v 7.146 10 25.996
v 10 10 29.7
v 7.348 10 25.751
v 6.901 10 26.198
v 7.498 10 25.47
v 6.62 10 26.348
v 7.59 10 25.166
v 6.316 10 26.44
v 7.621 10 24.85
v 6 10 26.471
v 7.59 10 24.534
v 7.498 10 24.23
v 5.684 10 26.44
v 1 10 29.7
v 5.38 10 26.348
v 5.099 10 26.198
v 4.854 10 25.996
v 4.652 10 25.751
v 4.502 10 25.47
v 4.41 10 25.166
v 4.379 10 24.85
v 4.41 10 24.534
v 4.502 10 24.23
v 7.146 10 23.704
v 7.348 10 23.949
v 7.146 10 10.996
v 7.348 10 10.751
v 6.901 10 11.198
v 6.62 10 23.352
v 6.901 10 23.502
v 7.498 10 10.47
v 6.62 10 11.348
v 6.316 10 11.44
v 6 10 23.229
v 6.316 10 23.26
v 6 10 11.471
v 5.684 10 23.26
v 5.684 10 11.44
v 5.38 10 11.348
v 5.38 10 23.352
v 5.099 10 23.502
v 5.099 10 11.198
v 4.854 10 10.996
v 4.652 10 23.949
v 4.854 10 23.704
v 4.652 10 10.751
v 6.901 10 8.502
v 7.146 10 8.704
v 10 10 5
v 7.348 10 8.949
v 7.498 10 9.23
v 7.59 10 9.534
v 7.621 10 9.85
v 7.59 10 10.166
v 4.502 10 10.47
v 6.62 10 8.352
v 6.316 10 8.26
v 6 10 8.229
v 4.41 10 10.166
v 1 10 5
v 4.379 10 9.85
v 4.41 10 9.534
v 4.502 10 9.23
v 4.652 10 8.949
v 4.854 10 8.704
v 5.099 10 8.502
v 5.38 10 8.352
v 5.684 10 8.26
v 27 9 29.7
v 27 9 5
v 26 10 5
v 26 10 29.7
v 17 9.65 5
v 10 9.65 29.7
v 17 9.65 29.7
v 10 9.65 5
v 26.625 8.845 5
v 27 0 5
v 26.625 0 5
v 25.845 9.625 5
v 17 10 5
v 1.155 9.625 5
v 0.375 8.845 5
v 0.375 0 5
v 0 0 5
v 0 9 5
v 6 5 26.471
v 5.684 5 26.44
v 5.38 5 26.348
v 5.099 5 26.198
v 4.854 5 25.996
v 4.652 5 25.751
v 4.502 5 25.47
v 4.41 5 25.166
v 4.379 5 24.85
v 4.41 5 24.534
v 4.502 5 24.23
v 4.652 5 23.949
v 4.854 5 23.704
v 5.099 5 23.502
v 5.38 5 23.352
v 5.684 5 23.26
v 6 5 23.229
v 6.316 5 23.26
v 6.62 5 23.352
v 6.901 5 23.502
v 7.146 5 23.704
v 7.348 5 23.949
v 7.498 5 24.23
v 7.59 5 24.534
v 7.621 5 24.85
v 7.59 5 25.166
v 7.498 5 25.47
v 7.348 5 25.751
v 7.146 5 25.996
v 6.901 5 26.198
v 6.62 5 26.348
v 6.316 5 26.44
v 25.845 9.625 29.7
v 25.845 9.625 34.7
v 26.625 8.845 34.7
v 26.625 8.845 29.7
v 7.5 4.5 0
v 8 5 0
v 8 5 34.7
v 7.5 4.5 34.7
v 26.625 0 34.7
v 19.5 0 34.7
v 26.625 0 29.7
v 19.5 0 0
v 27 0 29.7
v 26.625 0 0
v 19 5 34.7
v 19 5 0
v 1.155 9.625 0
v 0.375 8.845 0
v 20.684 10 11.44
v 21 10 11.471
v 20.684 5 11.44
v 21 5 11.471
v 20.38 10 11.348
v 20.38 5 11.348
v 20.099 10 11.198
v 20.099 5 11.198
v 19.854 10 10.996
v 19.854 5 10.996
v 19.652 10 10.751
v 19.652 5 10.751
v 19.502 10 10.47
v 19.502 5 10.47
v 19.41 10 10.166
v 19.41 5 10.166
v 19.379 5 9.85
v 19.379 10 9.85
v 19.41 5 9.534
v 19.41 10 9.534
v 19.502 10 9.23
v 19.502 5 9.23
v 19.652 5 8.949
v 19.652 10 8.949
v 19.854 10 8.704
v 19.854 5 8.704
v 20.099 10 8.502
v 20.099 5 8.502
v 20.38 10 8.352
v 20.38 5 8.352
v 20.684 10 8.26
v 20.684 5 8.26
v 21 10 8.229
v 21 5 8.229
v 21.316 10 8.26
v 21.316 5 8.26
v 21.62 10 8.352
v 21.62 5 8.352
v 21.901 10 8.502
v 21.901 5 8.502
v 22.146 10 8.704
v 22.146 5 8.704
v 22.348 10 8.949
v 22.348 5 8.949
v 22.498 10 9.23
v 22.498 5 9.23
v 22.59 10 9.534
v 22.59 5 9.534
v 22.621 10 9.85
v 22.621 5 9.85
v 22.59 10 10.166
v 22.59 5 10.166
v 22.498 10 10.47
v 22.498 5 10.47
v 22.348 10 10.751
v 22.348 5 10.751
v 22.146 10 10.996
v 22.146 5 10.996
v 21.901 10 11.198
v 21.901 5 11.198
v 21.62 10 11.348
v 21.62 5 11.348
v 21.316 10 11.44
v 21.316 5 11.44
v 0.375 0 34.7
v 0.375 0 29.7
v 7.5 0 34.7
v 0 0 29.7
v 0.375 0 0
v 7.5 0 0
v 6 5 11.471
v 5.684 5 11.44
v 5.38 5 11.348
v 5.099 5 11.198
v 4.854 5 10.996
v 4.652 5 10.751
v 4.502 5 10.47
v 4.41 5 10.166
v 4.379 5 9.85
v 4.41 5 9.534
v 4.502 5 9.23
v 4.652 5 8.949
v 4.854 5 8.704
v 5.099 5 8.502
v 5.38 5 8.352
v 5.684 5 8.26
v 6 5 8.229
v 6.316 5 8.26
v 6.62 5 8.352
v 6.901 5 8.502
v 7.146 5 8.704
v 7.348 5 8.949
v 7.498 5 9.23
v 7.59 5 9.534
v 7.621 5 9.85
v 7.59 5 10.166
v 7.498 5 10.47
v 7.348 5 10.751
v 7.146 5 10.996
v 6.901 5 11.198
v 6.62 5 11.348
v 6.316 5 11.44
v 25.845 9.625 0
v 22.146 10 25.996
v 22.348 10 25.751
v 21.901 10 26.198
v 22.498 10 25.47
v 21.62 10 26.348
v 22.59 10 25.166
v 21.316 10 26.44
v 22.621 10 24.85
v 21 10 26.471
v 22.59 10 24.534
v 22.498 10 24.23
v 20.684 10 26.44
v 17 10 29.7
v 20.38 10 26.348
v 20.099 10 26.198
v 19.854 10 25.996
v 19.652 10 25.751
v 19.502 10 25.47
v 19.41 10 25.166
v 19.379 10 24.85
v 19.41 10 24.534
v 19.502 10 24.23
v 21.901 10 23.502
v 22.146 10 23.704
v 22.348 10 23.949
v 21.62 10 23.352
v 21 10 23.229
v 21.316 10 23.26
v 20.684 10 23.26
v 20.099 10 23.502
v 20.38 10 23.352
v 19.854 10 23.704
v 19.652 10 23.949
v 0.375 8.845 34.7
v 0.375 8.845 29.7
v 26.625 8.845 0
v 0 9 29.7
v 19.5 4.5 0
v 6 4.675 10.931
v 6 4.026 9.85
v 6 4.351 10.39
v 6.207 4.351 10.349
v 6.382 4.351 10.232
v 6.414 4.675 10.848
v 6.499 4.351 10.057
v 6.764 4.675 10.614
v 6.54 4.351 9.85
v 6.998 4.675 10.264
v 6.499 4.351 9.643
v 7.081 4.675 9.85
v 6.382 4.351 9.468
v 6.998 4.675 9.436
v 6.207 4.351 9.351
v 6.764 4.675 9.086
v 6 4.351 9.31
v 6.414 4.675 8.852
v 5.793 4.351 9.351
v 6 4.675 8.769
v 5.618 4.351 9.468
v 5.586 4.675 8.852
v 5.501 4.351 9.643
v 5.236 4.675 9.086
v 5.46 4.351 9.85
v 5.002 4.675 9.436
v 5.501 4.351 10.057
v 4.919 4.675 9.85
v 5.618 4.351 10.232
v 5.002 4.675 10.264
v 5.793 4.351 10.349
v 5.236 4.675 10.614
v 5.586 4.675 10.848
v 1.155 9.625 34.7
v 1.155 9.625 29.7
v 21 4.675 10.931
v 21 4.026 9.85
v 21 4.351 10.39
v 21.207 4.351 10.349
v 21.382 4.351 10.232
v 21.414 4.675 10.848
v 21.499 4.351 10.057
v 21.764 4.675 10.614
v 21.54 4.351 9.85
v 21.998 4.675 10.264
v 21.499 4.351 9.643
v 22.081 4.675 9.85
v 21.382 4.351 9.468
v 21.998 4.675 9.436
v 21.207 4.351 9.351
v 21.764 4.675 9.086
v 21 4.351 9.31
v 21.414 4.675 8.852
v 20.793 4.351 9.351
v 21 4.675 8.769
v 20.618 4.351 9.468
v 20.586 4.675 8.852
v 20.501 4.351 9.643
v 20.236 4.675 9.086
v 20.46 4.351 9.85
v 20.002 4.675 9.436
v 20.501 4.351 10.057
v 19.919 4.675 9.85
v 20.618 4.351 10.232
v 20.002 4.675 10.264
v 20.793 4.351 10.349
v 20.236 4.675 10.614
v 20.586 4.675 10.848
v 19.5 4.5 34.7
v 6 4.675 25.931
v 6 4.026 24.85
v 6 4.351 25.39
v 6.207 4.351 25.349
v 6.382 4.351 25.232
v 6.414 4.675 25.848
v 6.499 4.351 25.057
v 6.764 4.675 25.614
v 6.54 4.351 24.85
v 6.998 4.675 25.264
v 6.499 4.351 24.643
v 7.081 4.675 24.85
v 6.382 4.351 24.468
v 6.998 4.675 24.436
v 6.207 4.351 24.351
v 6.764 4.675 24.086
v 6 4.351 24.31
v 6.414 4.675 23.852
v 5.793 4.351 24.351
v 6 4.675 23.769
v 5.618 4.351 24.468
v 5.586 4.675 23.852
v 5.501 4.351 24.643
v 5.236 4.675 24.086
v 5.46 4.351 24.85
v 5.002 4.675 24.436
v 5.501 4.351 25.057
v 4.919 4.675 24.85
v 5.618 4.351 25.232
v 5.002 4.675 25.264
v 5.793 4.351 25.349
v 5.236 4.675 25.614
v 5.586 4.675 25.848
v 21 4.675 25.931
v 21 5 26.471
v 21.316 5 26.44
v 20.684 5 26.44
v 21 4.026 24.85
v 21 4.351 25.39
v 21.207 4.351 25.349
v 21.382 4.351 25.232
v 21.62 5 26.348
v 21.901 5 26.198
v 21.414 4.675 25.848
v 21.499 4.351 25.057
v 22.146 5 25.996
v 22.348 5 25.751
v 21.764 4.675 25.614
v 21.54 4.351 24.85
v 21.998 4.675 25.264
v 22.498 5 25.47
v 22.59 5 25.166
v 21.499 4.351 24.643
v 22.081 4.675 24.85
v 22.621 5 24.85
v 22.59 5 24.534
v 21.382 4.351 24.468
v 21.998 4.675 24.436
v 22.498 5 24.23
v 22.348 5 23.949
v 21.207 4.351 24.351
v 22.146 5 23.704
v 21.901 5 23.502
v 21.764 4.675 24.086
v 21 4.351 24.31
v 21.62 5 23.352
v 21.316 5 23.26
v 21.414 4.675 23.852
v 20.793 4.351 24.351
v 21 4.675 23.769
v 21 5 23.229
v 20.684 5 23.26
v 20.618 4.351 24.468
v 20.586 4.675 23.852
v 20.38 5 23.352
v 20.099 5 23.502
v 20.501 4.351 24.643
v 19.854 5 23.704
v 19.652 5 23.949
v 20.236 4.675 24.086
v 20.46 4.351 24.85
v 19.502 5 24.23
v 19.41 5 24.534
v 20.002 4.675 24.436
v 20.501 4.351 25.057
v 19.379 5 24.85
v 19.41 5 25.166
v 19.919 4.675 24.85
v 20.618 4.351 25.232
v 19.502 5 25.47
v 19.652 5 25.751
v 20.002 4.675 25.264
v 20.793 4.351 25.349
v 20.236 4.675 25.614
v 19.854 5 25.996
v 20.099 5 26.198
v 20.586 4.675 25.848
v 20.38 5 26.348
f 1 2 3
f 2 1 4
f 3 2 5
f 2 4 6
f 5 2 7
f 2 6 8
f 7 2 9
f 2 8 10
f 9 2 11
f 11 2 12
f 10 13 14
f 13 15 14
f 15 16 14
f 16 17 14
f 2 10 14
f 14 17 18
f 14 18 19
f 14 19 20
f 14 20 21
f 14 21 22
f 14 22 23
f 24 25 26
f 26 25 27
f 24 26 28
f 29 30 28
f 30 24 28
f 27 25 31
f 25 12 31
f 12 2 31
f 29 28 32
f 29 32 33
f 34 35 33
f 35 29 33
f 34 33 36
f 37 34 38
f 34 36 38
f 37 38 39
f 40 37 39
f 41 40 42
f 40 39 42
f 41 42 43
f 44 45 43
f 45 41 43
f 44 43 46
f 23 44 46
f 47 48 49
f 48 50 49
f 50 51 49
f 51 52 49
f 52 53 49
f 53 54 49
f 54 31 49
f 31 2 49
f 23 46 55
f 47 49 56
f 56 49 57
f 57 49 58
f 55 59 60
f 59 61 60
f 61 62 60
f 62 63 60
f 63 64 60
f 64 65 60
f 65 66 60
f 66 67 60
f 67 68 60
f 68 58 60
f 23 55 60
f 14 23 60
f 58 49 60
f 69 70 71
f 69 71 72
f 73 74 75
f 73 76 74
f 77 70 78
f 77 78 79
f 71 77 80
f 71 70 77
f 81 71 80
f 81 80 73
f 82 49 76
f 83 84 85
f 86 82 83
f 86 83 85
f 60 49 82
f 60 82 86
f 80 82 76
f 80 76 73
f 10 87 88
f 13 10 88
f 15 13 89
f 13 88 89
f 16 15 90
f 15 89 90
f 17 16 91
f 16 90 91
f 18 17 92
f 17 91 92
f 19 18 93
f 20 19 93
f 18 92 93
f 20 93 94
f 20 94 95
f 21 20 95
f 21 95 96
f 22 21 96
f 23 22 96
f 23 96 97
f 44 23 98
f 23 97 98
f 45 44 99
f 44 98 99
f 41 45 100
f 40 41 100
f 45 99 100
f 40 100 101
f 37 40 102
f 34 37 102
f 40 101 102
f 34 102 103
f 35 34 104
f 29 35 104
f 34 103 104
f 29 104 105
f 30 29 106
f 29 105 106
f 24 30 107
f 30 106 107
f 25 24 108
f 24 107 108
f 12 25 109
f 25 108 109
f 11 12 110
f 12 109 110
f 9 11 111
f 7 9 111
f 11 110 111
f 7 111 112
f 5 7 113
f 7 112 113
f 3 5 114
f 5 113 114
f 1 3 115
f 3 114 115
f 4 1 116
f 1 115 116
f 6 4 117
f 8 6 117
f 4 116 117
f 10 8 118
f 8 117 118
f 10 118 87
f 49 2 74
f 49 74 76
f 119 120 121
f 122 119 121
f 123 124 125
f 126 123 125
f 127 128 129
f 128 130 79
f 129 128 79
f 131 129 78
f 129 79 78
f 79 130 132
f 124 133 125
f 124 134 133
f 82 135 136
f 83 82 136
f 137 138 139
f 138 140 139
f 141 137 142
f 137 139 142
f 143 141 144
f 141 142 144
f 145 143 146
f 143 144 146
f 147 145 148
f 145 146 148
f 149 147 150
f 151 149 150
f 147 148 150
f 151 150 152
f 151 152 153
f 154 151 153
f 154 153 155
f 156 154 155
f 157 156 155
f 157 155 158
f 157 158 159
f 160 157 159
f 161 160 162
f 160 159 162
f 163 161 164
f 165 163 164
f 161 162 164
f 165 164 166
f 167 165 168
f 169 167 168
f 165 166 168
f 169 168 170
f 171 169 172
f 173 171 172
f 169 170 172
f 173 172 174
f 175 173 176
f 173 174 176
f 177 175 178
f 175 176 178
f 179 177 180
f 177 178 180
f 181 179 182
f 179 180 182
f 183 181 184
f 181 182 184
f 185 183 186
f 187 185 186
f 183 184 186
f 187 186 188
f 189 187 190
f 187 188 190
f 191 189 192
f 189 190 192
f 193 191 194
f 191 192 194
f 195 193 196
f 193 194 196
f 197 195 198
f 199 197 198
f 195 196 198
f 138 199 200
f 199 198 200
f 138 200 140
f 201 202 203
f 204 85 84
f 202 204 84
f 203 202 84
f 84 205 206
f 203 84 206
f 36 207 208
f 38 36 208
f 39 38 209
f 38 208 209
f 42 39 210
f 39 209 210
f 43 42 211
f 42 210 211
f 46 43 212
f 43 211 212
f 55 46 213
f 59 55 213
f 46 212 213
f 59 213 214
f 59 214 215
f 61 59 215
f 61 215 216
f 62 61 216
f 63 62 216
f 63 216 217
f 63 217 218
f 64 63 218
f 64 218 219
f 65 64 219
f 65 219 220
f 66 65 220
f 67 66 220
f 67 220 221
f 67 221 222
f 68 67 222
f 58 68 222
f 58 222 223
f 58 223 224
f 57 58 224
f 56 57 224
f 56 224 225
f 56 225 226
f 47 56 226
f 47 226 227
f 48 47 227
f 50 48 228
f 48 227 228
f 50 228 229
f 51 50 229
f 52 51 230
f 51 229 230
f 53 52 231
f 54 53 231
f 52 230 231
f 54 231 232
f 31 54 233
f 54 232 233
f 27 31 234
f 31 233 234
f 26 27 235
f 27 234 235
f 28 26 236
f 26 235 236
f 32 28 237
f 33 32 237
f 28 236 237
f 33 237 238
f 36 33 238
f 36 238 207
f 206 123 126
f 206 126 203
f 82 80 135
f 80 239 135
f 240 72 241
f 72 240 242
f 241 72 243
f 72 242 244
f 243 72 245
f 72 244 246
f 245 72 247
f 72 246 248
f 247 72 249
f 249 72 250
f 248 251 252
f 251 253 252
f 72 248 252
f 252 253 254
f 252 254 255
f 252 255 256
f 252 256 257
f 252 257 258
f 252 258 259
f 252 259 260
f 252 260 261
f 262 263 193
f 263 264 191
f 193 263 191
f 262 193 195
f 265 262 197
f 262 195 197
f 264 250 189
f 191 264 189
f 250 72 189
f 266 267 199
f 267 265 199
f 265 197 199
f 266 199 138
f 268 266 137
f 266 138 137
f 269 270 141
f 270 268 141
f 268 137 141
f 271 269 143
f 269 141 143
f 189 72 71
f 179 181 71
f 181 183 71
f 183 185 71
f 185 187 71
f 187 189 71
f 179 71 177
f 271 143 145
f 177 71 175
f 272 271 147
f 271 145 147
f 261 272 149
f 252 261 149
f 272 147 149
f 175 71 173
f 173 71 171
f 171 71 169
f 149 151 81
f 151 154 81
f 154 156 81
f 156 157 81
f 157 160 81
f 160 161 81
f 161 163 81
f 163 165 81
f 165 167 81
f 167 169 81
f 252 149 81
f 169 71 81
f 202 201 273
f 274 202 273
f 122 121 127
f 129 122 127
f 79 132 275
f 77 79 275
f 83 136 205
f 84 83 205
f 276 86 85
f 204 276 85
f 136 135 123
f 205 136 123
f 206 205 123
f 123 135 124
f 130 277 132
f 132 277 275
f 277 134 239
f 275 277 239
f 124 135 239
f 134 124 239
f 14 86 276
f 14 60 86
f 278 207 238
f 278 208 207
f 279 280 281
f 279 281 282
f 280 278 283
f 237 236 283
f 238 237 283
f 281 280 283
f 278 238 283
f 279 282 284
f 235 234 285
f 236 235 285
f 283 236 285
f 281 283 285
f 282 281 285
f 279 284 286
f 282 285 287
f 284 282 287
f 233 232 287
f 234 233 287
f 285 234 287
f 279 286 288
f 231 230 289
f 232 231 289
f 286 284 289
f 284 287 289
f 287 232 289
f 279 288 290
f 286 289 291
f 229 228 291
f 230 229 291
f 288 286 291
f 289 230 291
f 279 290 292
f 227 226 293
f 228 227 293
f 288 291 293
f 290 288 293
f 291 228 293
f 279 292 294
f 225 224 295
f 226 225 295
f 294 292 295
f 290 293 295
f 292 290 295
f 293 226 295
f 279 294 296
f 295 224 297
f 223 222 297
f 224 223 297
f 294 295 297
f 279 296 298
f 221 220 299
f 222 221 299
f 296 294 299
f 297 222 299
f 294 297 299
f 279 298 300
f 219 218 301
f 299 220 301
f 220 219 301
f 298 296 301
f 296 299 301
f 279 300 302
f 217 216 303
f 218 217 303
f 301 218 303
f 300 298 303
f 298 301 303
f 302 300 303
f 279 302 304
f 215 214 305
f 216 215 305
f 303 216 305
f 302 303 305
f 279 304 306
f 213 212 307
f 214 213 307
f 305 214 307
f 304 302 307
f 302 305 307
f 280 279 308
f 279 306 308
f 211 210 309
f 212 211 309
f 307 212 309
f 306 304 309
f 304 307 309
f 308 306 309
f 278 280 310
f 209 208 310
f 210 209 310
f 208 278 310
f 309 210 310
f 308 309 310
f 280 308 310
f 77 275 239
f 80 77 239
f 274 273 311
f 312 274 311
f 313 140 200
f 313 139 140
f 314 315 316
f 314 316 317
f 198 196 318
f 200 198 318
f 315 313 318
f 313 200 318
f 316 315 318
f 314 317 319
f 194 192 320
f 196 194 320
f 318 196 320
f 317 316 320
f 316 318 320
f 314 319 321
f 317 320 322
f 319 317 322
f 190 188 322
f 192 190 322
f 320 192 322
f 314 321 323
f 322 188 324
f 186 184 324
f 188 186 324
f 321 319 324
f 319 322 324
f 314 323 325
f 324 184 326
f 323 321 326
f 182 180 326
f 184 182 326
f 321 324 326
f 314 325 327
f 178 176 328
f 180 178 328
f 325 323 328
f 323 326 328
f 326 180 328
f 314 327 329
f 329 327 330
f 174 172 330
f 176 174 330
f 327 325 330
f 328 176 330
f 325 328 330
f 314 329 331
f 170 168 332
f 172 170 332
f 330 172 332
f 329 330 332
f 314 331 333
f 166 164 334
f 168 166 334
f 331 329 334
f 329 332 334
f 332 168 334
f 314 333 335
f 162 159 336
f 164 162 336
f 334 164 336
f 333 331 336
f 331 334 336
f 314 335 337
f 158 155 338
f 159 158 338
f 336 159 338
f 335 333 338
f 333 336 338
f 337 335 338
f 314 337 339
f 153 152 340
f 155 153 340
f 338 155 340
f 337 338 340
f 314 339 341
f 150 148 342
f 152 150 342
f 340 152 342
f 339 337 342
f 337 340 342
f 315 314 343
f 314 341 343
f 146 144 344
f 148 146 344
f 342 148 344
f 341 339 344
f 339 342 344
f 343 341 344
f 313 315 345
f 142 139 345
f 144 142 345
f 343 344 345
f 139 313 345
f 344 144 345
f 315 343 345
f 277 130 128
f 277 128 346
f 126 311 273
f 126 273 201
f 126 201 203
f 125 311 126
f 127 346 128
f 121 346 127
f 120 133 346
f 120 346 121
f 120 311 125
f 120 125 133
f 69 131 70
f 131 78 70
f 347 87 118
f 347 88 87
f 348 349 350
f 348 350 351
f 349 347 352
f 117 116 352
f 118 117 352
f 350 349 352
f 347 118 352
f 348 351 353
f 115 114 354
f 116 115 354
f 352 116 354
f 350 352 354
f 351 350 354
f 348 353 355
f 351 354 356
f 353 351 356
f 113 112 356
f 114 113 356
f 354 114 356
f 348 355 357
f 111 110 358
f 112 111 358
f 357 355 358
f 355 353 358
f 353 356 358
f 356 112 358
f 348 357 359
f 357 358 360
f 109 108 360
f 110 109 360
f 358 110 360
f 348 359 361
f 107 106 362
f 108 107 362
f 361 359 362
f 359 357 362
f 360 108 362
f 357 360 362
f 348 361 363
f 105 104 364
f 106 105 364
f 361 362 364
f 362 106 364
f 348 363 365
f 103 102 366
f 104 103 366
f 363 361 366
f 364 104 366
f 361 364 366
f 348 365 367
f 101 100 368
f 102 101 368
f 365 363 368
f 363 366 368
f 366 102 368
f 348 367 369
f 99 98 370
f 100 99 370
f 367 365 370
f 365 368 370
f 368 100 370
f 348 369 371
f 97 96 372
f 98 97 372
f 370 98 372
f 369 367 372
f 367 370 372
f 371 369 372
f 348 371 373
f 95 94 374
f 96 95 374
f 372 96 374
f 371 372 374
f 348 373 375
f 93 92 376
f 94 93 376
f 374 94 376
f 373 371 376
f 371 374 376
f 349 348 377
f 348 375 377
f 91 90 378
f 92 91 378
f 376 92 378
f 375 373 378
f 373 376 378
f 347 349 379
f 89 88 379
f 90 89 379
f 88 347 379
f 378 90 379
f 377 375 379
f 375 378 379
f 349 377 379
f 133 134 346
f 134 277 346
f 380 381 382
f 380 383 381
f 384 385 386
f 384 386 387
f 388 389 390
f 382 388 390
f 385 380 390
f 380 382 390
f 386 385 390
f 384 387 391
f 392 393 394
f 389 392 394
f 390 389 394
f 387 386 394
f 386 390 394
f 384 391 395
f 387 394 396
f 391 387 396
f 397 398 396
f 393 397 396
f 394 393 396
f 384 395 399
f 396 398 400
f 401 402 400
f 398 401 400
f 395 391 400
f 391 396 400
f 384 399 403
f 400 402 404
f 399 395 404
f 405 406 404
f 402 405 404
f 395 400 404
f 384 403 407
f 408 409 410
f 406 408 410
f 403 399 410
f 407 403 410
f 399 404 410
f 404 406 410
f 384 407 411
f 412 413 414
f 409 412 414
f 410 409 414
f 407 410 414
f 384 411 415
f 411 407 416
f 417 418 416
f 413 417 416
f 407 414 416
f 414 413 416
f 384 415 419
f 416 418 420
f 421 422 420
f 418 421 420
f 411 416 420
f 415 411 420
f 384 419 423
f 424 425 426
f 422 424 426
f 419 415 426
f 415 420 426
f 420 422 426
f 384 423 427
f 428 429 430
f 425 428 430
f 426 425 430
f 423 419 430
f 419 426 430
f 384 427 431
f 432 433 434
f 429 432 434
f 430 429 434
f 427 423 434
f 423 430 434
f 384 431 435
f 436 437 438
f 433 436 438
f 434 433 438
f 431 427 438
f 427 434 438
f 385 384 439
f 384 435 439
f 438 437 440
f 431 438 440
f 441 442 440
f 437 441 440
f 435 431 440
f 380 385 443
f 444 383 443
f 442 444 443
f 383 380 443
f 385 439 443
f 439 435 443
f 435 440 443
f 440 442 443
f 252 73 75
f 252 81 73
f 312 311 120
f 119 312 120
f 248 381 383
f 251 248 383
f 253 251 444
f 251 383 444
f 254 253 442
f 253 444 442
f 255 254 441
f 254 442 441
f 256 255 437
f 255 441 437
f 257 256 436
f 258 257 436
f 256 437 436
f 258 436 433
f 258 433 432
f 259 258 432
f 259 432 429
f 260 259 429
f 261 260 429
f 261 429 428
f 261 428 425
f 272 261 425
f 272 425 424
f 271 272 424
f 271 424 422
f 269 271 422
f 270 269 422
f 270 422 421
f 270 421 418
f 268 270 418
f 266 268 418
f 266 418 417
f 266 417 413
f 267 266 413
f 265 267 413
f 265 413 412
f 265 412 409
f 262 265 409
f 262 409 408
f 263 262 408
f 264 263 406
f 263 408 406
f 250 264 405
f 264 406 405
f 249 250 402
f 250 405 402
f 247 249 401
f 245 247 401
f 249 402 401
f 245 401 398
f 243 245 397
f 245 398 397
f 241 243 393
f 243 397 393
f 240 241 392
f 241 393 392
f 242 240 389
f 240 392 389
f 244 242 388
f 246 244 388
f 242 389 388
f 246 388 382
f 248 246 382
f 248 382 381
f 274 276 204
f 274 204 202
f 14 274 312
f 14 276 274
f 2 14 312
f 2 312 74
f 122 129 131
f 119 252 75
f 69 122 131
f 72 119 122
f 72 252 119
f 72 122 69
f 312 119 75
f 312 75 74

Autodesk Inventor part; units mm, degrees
ref_plane "YZ Plane" through (0, 0, 0) normal (1, 0, 0) x (0, 1, 0)
ref_plane "XZ Plane" through (0, 0, 0) normal (0, 1, 0) x (-1, 0, 0)
ref_plane "XY Plane" through (0, 0, 0) normal (0, 0, 1) x (1, 0, 0)
sketch "Sketch1" plane through (0, 0, 0) normal (0, 0, 1) x (1, 0, 0)
  line L0 (0, 0) -> (27, 0)
  line L1 (27, 0) -> (27, 10)
  line L2 (27, 10) -> (0, 10)
  line L3 (0, 10) -> (0, 0)
  line L4 (7.5, 0) -> (19.5, 0)
  line L5 (19.5, 0) -> (19.5, 5)
  line L6 (19.5, 5) -> (7.5, 5)
  line L7 (7.5, 5) -> (7.5, 0)
  point P0 (13.5, 5)
  point P1 (13.5, 10)
  dimension "d0" = 27
  dimension "d1" = 10
  dimension "d2" = 5
  dimension "d3" = 12
extrude "Extrusion1" add sketch "Sketch1" along normal blind 34.7 contours L3 L2 L1 L0 L5 L6 L7
chamfer "Chamfer1" distance 1 angle 45 2 edges at (27, 10, 17.35) (0, 10, 17.35)
chamfer "Chamfer2" distance 0.5 angle 45 2 edges at (7.5, 5, 17.35) (19.5, 5, 17.35)
sketch "Sketch2" plane through (1, 10, 0) normal (0, 1, 0) x (1, 0, 0)
  line L0 (18, -34.7) -> (18, 0) projected
  line L1 (-1, 0) -> (-1, -34.7) projected
  line L2 (25, 0) -> (0, 0) projected
  line L3 (5, -9.85) -> (20, -9.85)
  line L4 (20, -9.85) -> (20, -24.85)
  line L5 (20, -24.85) -> (5, -24.85)
  line L6 (5, -24.85) -> (5, -9.85)
  line L7 (25, 0) -> (25, -34.7) projected
  point P0 (-1, -17.35)
  point P1 (12.5, 0)
  point P2 (12.5, -9.85)
  point P3 (12.5, 0)
  point P4 (20, -17.35)
  point P5 (25, -17.35)
  dimension "d12" = 15
  dimension "d13" = 15
hole "Hole1" at (21, 10, 9.85) at (21, 10, 24.85) at (6, 10, 24.85) at (6, 10, 9.85) direction (0, -1, 0) diameter 3.242 depth 5 tip angle 118 thread size "M4x0.7" class "6H" standard "ISO Metric profile"
sketch "Sketch3" plane through (0, 0, 34.7) normal (0, 0, 1) x (1, 0, 0)
  line L0 (0, 9) -> (0, 0) projected
  line L1 (0, 9) -> (1, 10) projected
  line L2 (26, 10) -> (1, 10) projected
  line L3 (26, 10) -> (27, 9) projected
  line L4 (27, 0) -> (27, 9) projected
  line L5 (0.375, 0) -> (0.375, 8.8447)
  line L6 (0.375, 8.8447) -> (1.1553, 9.625)
  line L7 (1.1553, 9.625) -> (25.8447, 9.625)
  line L8 (25.8447, 9.625) -> (26.625, 8.8447)
  line L9 (26.625, 8.8447) -> (26.625, 0)
  line L10 (19.5, 0) -> (27, 0) projected
  line L11 (26.625, 0) -> (27, 0)
  line L12 (27, 0) -> (0.375, 0)
  line L13 (0, 0) -> (7.5, 0) projected
  line L14 (0.375, 0) -> (0, 0)
  dimension "d21" = 0.375
extrude "Extrusion2" cut sketch "Sketch3" against normal blind 5 contours L1 L2 L3 L4 L10 L9 L8 L7 L6 L5 L13 L0
ref_plane "Work Plane1" through (0, 0, 17.35) normal (0, 0, 1) x (1, 0, 0)
mirror "Mirror1" about plane through (0, 0, 17.35) normal (0, 0, 1) of "Extrusion2"
sketch "Sketch4" plane through (1, 10, 29.7) normal (0, 1, 0) x (1, 0, 0)
  circle A0 centre (5, 19.85) radius 1.621 projected
  circle A1 centre (20, 4.85) radius 1.621 projected
  circle A2 centre (20, 19.85) radius 1.621 projected
  circle A3 centre (5, 4.85) radius 1.621 projected
  line L0 (25, 24.7) -> (0, 24.7) projected
  line L1 (0, 0) -> (0, 24.7) projected
  line L2 (0, 0) -> (25, 0) projected
  line L3 (25, 24.7) -> (25, 0) projected
  line L4 (25, 24.7) -> (0, 24.7) projected
  line L5 (0, 0) -> (25, 0) projected
  line L6 (9, 24.7) -> (16, 24.7)
  line L7 (16, 24.7) -> (16, 0)
  line L8 (16, 0) -> (9, 0)
  line L9 (9, 0) -> (9, 24.7)
  point P0 (-1, 29.7)
  point P1 (12.5, 24.7)
  point P2 (12.5, 24.7)
  dimension "d24" = 7
extrude "Extrusion3" cut sketch "Sketch4" against normal blind 0.35 contours L7 L2 L9 L0
properties part number "MGN Block"
